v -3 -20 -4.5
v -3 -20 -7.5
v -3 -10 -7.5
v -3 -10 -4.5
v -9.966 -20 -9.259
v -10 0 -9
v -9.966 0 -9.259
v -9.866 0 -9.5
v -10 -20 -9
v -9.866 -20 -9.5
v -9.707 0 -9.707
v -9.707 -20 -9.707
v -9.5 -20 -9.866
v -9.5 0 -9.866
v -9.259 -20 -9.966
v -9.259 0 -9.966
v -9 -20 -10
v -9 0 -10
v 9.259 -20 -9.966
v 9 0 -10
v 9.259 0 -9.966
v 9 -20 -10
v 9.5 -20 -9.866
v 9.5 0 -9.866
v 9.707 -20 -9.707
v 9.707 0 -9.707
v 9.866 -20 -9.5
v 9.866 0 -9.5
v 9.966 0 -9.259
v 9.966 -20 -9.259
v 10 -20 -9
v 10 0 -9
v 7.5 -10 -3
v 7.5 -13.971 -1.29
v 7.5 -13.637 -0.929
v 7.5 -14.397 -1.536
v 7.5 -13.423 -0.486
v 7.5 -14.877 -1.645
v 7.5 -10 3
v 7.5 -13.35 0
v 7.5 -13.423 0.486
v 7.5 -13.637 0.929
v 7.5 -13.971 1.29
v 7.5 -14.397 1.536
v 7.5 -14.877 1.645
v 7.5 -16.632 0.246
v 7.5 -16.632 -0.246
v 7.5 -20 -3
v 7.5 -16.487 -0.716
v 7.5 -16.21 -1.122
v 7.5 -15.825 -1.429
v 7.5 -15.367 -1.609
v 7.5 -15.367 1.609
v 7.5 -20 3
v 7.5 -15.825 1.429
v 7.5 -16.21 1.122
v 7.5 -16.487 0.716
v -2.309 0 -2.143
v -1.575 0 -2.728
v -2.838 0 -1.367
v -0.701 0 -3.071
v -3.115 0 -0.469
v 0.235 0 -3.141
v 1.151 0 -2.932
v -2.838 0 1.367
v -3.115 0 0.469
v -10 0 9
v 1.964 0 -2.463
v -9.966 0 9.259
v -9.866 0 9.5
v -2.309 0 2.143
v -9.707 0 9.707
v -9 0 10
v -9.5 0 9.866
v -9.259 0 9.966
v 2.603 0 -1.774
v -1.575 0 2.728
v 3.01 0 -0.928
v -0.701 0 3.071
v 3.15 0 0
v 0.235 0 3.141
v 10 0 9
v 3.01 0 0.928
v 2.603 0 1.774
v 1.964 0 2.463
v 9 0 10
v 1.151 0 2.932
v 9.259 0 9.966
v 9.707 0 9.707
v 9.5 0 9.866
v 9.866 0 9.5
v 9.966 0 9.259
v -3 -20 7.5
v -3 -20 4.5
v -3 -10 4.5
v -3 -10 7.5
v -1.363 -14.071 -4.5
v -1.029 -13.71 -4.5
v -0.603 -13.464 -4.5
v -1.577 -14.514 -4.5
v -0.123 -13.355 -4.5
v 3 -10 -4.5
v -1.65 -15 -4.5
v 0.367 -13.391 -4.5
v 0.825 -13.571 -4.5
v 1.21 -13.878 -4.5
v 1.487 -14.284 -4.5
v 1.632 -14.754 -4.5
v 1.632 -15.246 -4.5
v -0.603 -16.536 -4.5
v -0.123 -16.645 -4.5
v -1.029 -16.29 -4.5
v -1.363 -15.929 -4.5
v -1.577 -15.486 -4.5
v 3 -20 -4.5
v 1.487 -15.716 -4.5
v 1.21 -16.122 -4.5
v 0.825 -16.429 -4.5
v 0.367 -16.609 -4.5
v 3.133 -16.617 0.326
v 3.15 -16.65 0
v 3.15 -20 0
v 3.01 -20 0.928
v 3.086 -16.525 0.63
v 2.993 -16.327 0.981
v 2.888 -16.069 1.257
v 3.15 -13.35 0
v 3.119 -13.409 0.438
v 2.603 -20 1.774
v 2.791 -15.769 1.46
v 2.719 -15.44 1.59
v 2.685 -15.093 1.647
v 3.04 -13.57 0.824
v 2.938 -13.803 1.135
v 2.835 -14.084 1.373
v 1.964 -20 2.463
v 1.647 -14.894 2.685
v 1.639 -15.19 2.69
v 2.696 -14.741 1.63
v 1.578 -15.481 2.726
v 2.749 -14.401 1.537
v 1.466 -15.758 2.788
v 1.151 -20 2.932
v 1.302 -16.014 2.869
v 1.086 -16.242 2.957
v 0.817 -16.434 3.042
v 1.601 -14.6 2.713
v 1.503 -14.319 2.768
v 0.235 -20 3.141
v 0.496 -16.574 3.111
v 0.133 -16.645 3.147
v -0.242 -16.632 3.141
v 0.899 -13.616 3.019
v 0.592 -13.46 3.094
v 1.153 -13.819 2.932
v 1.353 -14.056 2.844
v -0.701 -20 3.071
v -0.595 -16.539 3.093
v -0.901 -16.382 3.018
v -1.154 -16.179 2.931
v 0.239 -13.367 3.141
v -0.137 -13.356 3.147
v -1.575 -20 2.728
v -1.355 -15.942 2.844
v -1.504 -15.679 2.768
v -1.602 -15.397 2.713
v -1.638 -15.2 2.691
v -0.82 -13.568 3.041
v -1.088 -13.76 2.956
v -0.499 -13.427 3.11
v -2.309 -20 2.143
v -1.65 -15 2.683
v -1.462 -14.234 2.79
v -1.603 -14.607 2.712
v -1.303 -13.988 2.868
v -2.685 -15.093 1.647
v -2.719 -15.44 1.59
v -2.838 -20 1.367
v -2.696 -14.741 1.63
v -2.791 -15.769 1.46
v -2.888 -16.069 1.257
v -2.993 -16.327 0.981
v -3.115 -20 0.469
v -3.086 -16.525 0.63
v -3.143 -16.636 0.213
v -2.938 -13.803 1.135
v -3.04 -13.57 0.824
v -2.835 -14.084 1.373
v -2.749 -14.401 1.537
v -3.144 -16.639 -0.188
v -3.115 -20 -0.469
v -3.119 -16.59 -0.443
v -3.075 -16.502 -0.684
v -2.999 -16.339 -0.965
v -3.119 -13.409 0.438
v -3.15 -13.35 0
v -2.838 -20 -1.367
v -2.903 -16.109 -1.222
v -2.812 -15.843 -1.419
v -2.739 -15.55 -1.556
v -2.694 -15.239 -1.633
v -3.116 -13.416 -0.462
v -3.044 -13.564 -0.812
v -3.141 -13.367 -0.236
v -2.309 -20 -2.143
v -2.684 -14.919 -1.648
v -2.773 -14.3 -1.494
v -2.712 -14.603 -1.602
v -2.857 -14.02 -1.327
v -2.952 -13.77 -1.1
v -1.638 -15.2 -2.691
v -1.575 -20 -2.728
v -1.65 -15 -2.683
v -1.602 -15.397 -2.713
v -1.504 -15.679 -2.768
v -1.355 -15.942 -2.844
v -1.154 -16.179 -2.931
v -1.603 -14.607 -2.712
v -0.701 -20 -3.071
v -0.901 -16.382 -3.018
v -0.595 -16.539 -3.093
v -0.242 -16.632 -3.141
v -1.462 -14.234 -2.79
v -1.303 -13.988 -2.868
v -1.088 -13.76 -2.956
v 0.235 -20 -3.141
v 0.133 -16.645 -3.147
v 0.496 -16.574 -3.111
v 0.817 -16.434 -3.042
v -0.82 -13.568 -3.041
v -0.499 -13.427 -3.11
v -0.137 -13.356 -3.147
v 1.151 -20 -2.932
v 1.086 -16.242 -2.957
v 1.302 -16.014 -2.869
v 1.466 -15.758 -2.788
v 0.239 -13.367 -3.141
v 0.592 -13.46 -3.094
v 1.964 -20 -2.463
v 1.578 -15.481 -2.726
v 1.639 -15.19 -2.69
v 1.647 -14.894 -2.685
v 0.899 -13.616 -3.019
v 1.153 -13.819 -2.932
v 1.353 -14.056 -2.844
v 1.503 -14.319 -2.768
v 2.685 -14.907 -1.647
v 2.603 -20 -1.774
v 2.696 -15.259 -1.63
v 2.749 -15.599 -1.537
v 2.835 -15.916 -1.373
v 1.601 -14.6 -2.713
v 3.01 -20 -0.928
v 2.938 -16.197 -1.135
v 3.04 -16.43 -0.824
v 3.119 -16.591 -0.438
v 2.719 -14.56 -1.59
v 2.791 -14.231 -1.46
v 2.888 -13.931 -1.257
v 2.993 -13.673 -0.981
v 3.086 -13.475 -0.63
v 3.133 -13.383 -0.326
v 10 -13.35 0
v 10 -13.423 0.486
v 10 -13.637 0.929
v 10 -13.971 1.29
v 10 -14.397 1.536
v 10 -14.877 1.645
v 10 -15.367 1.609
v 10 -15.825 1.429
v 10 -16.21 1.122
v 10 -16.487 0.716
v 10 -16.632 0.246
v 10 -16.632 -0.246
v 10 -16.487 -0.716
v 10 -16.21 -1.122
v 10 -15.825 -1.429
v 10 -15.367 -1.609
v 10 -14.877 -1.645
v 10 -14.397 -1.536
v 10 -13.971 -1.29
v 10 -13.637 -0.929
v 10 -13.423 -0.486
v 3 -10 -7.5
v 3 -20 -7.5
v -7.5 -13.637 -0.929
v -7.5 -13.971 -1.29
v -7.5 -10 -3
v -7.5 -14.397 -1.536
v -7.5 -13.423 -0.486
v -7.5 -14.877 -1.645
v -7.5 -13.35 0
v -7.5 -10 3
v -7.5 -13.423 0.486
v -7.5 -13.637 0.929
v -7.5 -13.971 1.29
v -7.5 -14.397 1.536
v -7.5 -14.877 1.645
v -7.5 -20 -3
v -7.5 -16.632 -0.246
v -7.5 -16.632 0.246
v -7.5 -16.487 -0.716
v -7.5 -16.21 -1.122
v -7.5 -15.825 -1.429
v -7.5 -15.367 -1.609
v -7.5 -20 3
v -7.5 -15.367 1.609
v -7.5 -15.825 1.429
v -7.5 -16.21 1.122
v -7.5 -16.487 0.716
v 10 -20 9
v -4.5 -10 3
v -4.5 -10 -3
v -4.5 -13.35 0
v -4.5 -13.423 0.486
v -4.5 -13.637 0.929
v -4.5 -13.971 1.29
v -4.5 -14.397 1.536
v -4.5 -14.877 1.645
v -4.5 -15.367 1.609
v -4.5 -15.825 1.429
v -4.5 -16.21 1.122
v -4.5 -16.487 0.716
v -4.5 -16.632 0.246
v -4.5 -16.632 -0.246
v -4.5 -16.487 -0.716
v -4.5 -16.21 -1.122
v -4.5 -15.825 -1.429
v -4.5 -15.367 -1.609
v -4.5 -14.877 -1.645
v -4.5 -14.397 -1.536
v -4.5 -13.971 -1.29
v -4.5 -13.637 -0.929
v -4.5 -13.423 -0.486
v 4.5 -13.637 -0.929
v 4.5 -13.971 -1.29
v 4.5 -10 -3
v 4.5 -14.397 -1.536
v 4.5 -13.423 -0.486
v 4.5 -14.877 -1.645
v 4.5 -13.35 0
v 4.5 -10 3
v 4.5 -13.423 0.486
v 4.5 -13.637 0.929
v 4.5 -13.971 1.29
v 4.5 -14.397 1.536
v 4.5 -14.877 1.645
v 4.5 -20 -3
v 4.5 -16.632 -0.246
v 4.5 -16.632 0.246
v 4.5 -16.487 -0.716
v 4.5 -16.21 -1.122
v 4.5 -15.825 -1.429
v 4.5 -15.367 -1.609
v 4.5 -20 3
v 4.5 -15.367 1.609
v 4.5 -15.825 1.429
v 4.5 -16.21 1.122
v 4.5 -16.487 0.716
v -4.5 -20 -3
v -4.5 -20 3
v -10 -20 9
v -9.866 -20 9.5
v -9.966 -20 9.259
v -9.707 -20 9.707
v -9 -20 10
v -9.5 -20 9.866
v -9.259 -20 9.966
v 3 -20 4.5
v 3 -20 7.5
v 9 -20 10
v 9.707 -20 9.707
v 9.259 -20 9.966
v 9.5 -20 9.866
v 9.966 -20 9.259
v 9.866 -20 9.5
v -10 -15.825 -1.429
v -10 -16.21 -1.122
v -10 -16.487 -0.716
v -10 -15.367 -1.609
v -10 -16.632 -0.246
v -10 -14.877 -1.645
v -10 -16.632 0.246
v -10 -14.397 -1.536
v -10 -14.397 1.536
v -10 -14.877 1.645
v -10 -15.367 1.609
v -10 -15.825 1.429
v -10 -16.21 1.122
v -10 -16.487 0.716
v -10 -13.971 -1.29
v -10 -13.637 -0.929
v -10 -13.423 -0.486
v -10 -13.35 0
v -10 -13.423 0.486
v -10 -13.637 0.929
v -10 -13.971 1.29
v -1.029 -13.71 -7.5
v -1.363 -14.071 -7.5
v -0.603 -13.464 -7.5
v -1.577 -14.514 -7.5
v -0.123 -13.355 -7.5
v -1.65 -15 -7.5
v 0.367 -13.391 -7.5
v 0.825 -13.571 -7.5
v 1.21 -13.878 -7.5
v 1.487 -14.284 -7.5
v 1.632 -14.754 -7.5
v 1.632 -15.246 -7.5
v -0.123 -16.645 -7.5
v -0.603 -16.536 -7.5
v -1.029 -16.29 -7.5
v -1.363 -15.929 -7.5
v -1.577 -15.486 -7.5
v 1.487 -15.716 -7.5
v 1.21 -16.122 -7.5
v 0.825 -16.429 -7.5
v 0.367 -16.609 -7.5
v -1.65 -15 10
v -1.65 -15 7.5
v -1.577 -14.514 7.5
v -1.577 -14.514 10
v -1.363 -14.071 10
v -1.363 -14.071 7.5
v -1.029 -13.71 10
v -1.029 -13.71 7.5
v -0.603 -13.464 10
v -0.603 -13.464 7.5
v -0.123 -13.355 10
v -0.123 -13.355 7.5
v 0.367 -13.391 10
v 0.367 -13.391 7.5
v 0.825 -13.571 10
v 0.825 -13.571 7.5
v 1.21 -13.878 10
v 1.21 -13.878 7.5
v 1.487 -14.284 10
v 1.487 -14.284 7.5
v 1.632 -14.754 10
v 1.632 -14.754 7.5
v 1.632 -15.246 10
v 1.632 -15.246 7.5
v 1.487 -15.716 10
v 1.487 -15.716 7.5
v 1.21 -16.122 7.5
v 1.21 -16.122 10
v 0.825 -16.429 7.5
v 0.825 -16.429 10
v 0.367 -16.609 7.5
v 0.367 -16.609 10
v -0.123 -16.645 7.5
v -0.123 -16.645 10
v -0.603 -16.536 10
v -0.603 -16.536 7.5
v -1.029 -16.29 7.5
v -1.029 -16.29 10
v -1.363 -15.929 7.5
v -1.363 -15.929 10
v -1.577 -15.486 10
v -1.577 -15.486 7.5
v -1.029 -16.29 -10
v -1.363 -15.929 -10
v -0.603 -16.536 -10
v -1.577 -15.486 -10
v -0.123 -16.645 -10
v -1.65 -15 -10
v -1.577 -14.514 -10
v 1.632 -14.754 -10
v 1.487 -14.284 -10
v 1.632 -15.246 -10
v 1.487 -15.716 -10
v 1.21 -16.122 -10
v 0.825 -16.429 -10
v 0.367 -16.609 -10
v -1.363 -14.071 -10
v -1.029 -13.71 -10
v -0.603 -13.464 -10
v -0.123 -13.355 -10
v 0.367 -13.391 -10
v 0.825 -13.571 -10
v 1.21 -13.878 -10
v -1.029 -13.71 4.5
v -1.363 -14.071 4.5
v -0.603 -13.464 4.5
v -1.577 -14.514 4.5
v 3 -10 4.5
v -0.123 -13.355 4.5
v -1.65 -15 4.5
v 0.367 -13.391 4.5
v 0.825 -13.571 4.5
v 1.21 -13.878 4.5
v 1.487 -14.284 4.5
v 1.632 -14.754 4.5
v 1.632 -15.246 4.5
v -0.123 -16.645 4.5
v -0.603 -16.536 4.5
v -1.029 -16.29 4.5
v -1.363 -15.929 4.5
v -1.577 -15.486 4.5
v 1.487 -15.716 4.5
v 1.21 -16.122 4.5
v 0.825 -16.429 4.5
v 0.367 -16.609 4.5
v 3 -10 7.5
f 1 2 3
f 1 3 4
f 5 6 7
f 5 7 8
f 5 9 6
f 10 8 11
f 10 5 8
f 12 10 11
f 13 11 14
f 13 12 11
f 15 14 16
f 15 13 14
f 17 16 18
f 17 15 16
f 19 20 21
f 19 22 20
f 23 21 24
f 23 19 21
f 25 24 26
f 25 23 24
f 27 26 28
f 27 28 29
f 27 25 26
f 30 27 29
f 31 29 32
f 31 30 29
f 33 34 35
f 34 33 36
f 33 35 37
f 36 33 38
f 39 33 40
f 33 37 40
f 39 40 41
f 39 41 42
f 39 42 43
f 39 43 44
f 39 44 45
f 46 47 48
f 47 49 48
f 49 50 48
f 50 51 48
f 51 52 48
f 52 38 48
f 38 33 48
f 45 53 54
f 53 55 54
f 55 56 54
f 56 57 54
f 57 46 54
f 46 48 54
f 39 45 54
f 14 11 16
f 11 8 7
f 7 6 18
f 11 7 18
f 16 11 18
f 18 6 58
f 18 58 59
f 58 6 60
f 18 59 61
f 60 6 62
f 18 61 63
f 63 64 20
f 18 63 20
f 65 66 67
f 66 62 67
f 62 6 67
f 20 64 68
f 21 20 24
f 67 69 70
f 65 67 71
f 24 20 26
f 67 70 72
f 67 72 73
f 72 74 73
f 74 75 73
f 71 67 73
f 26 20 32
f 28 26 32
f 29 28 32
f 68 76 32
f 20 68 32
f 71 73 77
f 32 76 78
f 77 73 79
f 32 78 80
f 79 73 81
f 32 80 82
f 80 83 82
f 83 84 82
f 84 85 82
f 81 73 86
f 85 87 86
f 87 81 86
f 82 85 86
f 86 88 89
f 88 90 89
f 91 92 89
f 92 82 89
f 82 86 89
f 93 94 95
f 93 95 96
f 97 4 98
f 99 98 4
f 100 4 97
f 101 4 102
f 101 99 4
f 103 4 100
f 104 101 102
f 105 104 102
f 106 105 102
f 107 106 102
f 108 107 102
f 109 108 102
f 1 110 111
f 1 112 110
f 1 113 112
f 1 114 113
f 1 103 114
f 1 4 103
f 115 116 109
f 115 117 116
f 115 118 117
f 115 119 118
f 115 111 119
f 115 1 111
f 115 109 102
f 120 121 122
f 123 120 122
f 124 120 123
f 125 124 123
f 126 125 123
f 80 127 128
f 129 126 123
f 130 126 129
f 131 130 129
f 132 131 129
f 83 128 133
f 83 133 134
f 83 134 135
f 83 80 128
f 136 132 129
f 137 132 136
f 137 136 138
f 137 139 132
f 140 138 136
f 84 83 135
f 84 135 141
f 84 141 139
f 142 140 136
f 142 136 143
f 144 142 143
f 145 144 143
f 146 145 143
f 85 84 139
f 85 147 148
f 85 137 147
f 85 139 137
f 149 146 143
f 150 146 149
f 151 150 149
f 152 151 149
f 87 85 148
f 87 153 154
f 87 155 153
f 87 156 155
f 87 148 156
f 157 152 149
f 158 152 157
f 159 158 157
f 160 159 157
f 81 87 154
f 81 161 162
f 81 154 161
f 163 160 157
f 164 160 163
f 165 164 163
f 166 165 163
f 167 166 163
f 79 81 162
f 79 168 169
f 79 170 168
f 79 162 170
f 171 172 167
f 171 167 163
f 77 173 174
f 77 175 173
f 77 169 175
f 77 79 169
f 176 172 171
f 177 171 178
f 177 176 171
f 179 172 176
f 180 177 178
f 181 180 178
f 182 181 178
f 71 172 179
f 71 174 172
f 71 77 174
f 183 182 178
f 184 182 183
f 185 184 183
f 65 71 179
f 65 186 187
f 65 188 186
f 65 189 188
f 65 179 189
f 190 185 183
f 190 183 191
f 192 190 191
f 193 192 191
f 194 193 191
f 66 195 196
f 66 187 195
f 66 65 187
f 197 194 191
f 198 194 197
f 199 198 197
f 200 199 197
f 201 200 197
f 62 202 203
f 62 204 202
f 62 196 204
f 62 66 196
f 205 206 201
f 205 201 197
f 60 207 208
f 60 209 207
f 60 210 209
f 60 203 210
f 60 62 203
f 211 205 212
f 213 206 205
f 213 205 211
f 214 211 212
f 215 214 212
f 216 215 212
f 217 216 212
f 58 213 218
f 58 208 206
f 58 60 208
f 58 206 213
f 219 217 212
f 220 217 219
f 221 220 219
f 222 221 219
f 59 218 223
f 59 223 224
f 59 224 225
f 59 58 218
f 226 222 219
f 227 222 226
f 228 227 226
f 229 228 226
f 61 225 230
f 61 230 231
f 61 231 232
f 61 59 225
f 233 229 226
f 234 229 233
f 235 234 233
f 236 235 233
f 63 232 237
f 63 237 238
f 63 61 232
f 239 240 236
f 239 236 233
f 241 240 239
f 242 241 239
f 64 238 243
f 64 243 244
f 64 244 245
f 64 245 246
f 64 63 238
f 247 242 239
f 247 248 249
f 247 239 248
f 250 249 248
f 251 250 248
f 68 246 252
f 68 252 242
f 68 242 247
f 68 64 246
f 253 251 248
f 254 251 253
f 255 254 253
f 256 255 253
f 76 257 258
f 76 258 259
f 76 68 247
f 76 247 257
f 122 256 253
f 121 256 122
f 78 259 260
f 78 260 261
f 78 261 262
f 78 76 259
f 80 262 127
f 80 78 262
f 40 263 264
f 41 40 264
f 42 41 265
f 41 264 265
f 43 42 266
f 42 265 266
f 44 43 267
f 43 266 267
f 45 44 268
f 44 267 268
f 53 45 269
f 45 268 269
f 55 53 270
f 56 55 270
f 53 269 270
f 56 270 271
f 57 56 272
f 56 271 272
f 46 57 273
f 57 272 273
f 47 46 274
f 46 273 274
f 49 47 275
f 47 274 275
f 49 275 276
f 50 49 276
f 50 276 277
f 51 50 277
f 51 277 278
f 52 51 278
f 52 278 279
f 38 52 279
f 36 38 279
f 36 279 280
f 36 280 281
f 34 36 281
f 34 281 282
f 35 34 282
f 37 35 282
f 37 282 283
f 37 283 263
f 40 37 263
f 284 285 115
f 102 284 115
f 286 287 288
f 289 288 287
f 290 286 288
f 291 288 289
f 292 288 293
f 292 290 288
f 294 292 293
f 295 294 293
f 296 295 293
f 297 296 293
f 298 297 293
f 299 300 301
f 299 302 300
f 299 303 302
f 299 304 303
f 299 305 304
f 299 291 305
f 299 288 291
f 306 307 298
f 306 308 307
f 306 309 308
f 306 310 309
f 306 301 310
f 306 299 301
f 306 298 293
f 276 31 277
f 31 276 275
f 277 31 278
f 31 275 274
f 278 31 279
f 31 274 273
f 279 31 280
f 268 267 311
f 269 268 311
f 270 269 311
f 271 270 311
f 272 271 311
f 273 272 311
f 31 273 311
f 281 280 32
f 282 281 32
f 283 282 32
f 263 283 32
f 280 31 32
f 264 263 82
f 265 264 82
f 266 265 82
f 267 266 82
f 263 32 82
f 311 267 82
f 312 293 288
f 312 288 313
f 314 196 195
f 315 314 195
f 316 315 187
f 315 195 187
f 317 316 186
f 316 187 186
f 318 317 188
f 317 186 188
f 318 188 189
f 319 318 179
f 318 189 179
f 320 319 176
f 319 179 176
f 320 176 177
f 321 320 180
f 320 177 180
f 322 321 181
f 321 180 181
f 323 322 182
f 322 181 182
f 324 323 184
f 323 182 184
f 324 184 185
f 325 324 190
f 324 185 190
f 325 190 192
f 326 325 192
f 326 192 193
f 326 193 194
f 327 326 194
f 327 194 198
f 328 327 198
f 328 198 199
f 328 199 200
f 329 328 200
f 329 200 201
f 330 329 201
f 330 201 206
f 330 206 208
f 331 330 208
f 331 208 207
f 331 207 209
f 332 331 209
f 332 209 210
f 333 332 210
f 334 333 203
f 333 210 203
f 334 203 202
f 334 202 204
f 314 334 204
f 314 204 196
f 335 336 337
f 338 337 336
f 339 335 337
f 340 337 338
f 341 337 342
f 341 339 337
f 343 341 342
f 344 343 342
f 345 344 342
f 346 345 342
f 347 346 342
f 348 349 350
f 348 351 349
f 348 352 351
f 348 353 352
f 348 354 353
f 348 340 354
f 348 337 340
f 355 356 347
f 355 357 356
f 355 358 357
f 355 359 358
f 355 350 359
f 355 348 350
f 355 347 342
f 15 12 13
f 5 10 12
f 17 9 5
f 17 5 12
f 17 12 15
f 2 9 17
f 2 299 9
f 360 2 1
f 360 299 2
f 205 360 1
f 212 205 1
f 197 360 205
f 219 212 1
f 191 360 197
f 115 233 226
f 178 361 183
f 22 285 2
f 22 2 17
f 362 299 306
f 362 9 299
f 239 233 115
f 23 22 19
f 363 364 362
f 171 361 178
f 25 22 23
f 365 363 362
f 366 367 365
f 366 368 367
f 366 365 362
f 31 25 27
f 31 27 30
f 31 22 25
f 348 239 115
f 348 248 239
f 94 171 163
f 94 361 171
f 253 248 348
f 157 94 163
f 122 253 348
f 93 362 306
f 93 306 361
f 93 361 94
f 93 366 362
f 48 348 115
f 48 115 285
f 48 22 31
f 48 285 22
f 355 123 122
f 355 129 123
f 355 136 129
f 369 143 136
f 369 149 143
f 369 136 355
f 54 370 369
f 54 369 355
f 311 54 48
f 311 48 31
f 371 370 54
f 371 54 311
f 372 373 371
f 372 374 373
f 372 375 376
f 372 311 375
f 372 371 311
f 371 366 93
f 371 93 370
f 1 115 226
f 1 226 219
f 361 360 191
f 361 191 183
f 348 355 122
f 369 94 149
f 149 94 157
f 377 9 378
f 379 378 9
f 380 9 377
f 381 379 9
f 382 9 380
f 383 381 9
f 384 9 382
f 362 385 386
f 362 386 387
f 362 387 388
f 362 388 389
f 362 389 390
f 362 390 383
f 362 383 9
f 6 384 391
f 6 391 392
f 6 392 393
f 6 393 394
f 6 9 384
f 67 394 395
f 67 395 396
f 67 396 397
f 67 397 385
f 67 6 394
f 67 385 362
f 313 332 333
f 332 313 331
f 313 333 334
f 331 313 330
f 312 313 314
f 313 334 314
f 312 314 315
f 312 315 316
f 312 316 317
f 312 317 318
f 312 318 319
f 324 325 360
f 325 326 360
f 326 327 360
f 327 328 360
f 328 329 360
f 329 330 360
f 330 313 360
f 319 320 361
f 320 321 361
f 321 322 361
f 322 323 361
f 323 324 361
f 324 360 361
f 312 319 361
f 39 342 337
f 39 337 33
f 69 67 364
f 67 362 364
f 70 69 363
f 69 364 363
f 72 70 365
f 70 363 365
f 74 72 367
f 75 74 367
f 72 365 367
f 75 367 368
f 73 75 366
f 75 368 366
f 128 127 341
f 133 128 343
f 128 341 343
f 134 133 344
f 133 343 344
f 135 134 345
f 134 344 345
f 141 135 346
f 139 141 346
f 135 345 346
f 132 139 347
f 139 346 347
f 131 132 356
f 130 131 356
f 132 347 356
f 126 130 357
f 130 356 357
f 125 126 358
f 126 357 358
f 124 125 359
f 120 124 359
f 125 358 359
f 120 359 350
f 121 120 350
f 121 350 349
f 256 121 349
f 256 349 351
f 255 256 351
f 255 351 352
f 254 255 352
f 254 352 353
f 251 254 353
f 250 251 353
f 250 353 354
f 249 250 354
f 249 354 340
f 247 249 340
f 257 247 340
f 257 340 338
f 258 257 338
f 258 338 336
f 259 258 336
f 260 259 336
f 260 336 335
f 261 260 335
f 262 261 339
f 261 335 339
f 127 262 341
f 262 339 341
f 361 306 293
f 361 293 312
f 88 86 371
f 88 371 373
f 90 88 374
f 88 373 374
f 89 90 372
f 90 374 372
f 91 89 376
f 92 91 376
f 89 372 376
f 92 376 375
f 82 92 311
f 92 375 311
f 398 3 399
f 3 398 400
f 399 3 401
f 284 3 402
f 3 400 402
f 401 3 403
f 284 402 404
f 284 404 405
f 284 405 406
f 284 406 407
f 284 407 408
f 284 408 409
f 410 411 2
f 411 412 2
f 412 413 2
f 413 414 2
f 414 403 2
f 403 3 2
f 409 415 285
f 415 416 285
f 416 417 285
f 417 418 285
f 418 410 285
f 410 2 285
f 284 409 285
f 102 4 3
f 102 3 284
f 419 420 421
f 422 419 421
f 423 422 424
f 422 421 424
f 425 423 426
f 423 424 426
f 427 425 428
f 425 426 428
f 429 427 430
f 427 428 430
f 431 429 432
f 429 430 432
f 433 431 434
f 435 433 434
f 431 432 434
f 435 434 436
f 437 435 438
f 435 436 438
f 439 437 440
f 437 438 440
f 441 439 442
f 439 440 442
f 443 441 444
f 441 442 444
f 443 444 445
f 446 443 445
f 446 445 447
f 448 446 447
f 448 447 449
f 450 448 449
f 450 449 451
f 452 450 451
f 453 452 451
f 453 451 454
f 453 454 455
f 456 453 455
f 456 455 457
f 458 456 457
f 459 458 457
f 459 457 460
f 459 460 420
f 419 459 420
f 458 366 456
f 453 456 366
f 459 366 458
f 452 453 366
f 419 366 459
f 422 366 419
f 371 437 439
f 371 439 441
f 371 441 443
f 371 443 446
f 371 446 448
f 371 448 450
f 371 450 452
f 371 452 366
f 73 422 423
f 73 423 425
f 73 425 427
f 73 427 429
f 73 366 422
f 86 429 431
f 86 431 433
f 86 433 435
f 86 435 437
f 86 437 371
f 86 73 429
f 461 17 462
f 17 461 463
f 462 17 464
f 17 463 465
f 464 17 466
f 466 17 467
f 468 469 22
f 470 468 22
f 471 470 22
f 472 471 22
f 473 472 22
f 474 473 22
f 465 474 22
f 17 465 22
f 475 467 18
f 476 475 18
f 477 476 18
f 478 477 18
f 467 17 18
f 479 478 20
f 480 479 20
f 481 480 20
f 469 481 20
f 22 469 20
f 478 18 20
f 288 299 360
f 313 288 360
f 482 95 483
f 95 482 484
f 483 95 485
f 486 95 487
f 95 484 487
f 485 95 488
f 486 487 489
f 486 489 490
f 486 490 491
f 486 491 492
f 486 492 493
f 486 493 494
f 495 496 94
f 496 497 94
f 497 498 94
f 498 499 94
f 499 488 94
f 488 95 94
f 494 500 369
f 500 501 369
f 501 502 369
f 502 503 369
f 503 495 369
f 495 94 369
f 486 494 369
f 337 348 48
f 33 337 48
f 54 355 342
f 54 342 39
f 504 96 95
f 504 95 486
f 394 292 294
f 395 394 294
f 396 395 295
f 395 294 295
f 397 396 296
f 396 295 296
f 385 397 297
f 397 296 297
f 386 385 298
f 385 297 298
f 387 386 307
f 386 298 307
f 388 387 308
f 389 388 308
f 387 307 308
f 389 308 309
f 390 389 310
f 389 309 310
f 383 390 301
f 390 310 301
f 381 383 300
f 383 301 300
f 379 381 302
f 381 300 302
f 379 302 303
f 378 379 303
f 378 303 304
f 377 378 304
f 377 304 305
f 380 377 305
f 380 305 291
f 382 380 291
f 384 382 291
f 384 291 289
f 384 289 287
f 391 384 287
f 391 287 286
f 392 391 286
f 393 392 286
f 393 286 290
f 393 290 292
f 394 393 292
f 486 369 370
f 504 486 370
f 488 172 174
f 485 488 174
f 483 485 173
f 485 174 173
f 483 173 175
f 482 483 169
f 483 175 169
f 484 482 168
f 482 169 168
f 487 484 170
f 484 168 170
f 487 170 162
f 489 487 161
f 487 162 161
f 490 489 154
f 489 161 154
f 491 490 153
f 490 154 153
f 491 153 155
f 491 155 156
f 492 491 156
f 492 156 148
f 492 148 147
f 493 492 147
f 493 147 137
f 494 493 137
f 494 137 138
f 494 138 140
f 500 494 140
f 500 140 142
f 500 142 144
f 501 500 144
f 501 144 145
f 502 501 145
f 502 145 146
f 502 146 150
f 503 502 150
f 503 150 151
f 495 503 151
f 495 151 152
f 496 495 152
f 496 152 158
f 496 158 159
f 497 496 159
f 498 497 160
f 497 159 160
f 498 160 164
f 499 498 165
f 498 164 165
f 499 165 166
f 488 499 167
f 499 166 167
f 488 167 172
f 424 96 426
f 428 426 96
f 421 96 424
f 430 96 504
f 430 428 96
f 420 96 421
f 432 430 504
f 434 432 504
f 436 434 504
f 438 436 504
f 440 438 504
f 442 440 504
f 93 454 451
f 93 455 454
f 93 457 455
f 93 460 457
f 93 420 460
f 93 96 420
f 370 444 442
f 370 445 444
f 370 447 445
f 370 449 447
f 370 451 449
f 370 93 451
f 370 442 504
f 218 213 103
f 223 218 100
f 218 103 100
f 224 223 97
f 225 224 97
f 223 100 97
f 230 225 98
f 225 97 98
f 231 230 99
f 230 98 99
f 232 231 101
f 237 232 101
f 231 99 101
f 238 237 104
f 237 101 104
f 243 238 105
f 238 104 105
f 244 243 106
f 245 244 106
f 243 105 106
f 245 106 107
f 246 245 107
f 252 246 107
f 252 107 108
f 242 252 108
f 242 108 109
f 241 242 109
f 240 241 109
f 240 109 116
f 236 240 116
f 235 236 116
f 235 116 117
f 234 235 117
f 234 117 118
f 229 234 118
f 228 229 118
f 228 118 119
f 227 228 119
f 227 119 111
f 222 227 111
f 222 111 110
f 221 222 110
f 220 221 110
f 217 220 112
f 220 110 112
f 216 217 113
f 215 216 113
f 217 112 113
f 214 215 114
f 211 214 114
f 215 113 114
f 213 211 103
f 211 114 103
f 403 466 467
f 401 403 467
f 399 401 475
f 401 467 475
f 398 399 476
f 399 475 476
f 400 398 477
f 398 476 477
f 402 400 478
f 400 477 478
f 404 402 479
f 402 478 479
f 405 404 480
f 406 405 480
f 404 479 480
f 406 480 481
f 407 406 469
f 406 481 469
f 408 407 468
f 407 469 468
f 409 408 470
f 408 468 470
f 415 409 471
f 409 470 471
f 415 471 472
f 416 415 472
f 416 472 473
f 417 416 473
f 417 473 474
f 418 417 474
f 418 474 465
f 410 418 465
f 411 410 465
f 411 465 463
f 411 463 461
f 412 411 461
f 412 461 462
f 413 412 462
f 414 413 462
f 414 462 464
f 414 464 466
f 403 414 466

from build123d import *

# Parameters (mm, degrees)
F0_W       = 20
F0_H       = 20
F0_R       = 3.15
F1_DEPTH   = 20
F2_W       = 6
F2_H       = 3
F2_W_2     = 3
F2_H_2     = 6
F3_DEPTH   = 10
F6_D       = 3.3
F6_ON_F5_D = 3.3
F7_R       = 1


with BuildPart() as f1:
    # F0 (on Front) → F1 (new body)
    with BuildSketch(Plane.XZ):
        Rectangle(F0_W, F0_H)
        Circle(F0_R, mode=Mode.SUBTRACT)
    extrude(amount=F1_DEPTH)

    # F2 (on face) → F3 (cut)
    with BuildSketch(Plane.XZ.offset(20)):
        with Locations((0, 6)):
            Rectangle(F2_W, F2_H)
        with Locations((-6, 0)):
            Rectangle(F2_W_2, F2_H_2)
        with Locations((6, 0)):
            Rectangle(F2_W_2, F2_H_2)
        with Locations((0, -6)):
            Rectangle(F2_W, F2_H)
    extrude(amount=-F3_DEPTH, mode=Mode.SUBTRACT)

    # F6 (through all)
    with Locations(Plane.XY.offset(10)):
        with Locations((0, -15)):
            Hole(F6_D / 2)

    # F6 on F5 (through all)
    with Locations(Plane(origin=(-10, 0, 0), x_dir=(0, -1, 0), z_dir=(-1, 0, 0))):
        with Locations((15, 0)):
            Hole(F6_ON_F5_D / 2)

    # F7
    f7_edges = [f1.edges().sort_by_distance(p)[0] for p in [
        (-10, -10, 10),
        (10, -10, 10),
        (-10, -10, -10),
        (10, -10, -10),
    ]]
    fillet(f7_edges, radius=F7_R)


solid = f1.part
